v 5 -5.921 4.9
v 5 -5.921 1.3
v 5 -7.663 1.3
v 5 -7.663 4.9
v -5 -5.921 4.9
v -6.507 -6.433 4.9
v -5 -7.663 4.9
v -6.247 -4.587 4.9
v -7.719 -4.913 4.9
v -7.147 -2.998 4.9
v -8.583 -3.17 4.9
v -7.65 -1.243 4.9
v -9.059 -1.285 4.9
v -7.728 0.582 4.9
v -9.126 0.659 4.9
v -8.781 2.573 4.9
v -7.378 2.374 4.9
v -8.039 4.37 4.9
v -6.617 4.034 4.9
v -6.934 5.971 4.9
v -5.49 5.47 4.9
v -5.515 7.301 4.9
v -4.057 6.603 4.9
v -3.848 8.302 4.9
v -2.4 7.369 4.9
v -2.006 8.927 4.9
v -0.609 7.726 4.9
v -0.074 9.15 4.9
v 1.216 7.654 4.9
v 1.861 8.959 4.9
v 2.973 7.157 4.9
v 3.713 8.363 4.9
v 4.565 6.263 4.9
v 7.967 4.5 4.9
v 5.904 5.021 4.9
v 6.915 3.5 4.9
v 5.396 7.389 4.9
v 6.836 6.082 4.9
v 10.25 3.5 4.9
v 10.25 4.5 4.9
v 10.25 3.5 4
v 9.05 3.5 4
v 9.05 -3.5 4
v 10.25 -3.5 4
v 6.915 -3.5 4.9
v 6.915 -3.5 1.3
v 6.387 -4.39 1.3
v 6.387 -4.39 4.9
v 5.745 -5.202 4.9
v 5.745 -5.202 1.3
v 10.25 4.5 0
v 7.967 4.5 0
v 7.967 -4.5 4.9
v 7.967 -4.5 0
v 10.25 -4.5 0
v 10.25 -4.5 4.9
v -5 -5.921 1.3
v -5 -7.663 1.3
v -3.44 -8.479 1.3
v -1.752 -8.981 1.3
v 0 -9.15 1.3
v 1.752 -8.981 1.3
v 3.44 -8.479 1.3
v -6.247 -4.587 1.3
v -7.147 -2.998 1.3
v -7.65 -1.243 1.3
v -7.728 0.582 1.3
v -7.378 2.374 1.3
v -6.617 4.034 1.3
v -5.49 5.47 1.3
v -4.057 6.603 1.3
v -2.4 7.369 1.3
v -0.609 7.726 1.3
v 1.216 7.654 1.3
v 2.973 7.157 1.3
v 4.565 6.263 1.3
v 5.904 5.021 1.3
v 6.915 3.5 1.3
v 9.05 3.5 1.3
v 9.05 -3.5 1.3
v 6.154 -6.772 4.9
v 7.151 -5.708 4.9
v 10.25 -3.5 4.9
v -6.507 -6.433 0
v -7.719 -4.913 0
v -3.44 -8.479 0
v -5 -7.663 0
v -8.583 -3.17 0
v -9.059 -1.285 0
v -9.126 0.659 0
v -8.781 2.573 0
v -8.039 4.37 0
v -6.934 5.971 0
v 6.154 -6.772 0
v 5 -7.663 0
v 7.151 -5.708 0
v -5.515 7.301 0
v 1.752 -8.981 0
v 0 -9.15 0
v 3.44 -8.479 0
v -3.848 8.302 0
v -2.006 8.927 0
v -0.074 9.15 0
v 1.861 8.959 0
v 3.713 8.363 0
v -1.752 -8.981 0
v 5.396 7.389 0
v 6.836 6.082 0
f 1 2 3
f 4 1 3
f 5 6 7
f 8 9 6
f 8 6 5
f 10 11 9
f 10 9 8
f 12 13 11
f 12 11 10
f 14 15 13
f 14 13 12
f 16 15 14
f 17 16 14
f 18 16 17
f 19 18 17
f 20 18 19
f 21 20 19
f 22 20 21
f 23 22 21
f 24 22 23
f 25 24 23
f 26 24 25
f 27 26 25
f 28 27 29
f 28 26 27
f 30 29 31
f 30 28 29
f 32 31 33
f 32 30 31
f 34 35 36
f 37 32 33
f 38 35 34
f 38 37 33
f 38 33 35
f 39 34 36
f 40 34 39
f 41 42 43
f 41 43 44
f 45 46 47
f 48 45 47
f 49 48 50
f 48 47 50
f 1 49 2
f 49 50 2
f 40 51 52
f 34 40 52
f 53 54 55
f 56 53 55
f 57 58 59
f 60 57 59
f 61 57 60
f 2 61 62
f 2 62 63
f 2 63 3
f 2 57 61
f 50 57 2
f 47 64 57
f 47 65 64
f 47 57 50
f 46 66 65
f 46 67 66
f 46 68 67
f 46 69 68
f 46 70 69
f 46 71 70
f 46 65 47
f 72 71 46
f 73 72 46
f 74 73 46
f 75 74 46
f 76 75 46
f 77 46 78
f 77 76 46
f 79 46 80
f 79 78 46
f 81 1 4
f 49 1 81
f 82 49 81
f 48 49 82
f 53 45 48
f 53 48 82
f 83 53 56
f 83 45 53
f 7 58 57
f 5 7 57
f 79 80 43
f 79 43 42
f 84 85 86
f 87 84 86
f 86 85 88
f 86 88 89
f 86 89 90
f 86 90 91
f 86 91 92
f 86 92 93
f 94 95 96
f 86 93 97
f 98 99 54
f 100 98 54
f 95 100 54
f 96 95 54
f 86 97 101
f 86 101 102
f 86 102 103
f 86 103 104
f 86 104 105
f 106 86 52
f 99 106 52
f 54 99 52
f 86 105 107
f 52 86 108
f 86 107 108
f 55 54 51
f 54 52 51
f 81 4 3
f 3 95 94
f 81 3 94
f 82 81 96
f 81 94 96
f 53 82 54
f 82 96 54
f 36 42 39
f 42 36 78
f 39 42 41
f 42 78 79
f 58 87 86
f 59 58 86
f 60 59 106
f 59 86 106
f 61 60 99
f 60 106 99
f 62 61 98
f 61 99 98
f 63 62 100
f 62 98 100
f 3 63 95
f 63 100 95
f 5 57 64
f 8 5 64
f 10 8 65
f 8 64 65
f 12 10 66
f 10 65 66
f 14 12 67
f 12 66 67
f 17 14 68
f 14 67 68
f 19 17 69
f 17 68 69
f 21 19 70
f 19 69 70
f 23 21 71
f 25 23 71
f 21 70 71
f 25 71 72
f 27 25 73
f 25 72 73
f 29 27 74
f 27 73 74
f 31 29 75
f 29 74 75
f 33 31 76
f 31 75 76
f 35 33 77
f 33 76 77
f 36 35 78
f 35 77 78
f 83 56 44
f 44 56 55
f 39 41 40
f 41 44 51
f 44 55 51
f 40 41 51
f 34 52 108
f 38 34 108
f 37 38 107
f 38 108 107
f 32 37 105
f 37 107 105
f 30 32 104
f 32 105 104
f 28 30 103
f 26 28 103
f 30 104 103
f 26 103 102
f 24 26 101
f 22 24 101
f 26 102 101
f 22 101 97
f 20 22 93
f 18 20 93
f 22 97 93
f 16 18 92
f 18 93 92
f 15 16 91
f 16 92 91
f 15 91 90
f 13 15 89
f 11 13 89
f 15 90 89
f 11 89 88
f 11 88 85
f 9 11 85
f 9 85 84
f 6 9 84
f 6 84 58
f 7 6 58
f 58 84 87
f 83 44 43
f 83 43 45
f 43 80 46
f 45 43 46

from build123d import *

# Parameters (mm, degrees)
F0_W     = 1.2
F0_H     = 7
F1_DEPTH = 1.3
F2_DEPTH = 4.9
F3_DEPTH = 4


with BuildPart() as f1:
    # F0 (on Top) → F1 (new body)
    with BuildSketch(Plane.XY):
        with BuildLine():
            Line((9.05, 3.5), (6.914658, 3.5))
            ThreePointArc((6.914658, 3.5), (-4.806972, 6.079105), (-5, -5.92136))
            ThreePointArc((-5, -5.92136), (0, -7.75), (5, -5.92136))
            ThreePointArc((5, -5.92136), (6.079105, -4.806972), (6.914658, -3.5))
            Line((6.914658, -3.5), (9.05, -3.5))
            Line((9.05, -3.5), (9.05, 3.5))
        make_face()
        with BuildLine():
            ThreePointArc((-5, -5.92136), (-4.806972, 6.079105), (6.914658, 3.5))
            Line((6.914658, 3.5), (9.05, 3.5))
            Line((9.05, 3.5), (10.25, 3.5))
            Line((10.25, 3.5), (10.25, 4.5))
            Line((10.25, 4.5), (7.966963, 4.5))
            ThreePointArc((7.966963, 4.5), (-6.259851, 6.673588), (-5, -7.663061))
            Line((-5, -7.663061), (-5, -5.92136))
        make_face()
        with BuildLine():
            ThreePointArc((5, -5.92136), (0, -7.75), (-5, -5.92136))
            Line((-5, -5.92136), (-5, -7.663061))
            ThreePointArc((-5, -7.663061), (0, -9.15), (5, -7.663061))
            Line((5, -7.663061), (5, -5.92136))
        make_face()
        with Locations((9.65, 0)):
            Rectangle(F0_W, F0_H)
        with BuildLine():
            ThreePointArc((6.914658, -3.5), (6.079105, -4.806972), (5, -5.92136))
            Line((5, -5.92136), (5, -7.663061))
            ThreePointArc((5, -7.663061), (6.673588, -6.259851), (7.966963, -4.5))
            Line((7.966963, -4.5), (10.25, -4.5))
            Line((10.25, -4.5), (10.25, -3.5))
            Line((10.25, -3.5), (9.05, -3.5))
            Line((9.05, -3.5), (6.914658, -3.5))
        make_face()
    extrude(amount=F1_DEPTH)

    # F0 (on Top) → F2 (join)
    with BuildSketch(Plane.XY):
        with BuildLine():
            ThreePointArc((-5, -5.92136), (-4.806972, 6.079105), (6.914658, 3.5))
            Line((6.914658, 3.5), (9.05, 3.5))
            Line((9.05, 3.5), (10.25, 3.5))
            Line((10.25, 3.5), (10.25, 4.5))
            Line((10.25, 4.5), (7.966963, 4.5))
            ThreePointArc((7.966963, 4.5), (-6.259851, 6.673588), (-5, -7.663061))
            Line((-5, -7.663061), (-5, -5.92136))
        make_face()
        with BuildLine():
            ThreePointArc((6.914658, -3.5), (6.079105, -4.806972), (5, -5.92136))
            Line((5, -5.92136), (5, -7.663061))
            ThreePointArc((5, -7.663061), (6.673588, -6.259851), (7.966963, -4.5))
            Line((7.966963, -4.5), (10.25, -4.5))
            Line((10.25, -4.5), (10.25, -3.5))
            Line((10.25, -3.5), (9.05, -3.5))
            Line((9.05, -3.5), (6.914658, -3.5))
        make_face()
    extrude(amount=F2_DEPTH)

    # F0 (on Top) → F3 (join)
    with BuildSketch(Plane.XY):
        with Locations((9.65, 0)):
            Rectangle(F0_W, F0_H)
    extrude(amount=F3_DEPTH)


solid = f1.part
